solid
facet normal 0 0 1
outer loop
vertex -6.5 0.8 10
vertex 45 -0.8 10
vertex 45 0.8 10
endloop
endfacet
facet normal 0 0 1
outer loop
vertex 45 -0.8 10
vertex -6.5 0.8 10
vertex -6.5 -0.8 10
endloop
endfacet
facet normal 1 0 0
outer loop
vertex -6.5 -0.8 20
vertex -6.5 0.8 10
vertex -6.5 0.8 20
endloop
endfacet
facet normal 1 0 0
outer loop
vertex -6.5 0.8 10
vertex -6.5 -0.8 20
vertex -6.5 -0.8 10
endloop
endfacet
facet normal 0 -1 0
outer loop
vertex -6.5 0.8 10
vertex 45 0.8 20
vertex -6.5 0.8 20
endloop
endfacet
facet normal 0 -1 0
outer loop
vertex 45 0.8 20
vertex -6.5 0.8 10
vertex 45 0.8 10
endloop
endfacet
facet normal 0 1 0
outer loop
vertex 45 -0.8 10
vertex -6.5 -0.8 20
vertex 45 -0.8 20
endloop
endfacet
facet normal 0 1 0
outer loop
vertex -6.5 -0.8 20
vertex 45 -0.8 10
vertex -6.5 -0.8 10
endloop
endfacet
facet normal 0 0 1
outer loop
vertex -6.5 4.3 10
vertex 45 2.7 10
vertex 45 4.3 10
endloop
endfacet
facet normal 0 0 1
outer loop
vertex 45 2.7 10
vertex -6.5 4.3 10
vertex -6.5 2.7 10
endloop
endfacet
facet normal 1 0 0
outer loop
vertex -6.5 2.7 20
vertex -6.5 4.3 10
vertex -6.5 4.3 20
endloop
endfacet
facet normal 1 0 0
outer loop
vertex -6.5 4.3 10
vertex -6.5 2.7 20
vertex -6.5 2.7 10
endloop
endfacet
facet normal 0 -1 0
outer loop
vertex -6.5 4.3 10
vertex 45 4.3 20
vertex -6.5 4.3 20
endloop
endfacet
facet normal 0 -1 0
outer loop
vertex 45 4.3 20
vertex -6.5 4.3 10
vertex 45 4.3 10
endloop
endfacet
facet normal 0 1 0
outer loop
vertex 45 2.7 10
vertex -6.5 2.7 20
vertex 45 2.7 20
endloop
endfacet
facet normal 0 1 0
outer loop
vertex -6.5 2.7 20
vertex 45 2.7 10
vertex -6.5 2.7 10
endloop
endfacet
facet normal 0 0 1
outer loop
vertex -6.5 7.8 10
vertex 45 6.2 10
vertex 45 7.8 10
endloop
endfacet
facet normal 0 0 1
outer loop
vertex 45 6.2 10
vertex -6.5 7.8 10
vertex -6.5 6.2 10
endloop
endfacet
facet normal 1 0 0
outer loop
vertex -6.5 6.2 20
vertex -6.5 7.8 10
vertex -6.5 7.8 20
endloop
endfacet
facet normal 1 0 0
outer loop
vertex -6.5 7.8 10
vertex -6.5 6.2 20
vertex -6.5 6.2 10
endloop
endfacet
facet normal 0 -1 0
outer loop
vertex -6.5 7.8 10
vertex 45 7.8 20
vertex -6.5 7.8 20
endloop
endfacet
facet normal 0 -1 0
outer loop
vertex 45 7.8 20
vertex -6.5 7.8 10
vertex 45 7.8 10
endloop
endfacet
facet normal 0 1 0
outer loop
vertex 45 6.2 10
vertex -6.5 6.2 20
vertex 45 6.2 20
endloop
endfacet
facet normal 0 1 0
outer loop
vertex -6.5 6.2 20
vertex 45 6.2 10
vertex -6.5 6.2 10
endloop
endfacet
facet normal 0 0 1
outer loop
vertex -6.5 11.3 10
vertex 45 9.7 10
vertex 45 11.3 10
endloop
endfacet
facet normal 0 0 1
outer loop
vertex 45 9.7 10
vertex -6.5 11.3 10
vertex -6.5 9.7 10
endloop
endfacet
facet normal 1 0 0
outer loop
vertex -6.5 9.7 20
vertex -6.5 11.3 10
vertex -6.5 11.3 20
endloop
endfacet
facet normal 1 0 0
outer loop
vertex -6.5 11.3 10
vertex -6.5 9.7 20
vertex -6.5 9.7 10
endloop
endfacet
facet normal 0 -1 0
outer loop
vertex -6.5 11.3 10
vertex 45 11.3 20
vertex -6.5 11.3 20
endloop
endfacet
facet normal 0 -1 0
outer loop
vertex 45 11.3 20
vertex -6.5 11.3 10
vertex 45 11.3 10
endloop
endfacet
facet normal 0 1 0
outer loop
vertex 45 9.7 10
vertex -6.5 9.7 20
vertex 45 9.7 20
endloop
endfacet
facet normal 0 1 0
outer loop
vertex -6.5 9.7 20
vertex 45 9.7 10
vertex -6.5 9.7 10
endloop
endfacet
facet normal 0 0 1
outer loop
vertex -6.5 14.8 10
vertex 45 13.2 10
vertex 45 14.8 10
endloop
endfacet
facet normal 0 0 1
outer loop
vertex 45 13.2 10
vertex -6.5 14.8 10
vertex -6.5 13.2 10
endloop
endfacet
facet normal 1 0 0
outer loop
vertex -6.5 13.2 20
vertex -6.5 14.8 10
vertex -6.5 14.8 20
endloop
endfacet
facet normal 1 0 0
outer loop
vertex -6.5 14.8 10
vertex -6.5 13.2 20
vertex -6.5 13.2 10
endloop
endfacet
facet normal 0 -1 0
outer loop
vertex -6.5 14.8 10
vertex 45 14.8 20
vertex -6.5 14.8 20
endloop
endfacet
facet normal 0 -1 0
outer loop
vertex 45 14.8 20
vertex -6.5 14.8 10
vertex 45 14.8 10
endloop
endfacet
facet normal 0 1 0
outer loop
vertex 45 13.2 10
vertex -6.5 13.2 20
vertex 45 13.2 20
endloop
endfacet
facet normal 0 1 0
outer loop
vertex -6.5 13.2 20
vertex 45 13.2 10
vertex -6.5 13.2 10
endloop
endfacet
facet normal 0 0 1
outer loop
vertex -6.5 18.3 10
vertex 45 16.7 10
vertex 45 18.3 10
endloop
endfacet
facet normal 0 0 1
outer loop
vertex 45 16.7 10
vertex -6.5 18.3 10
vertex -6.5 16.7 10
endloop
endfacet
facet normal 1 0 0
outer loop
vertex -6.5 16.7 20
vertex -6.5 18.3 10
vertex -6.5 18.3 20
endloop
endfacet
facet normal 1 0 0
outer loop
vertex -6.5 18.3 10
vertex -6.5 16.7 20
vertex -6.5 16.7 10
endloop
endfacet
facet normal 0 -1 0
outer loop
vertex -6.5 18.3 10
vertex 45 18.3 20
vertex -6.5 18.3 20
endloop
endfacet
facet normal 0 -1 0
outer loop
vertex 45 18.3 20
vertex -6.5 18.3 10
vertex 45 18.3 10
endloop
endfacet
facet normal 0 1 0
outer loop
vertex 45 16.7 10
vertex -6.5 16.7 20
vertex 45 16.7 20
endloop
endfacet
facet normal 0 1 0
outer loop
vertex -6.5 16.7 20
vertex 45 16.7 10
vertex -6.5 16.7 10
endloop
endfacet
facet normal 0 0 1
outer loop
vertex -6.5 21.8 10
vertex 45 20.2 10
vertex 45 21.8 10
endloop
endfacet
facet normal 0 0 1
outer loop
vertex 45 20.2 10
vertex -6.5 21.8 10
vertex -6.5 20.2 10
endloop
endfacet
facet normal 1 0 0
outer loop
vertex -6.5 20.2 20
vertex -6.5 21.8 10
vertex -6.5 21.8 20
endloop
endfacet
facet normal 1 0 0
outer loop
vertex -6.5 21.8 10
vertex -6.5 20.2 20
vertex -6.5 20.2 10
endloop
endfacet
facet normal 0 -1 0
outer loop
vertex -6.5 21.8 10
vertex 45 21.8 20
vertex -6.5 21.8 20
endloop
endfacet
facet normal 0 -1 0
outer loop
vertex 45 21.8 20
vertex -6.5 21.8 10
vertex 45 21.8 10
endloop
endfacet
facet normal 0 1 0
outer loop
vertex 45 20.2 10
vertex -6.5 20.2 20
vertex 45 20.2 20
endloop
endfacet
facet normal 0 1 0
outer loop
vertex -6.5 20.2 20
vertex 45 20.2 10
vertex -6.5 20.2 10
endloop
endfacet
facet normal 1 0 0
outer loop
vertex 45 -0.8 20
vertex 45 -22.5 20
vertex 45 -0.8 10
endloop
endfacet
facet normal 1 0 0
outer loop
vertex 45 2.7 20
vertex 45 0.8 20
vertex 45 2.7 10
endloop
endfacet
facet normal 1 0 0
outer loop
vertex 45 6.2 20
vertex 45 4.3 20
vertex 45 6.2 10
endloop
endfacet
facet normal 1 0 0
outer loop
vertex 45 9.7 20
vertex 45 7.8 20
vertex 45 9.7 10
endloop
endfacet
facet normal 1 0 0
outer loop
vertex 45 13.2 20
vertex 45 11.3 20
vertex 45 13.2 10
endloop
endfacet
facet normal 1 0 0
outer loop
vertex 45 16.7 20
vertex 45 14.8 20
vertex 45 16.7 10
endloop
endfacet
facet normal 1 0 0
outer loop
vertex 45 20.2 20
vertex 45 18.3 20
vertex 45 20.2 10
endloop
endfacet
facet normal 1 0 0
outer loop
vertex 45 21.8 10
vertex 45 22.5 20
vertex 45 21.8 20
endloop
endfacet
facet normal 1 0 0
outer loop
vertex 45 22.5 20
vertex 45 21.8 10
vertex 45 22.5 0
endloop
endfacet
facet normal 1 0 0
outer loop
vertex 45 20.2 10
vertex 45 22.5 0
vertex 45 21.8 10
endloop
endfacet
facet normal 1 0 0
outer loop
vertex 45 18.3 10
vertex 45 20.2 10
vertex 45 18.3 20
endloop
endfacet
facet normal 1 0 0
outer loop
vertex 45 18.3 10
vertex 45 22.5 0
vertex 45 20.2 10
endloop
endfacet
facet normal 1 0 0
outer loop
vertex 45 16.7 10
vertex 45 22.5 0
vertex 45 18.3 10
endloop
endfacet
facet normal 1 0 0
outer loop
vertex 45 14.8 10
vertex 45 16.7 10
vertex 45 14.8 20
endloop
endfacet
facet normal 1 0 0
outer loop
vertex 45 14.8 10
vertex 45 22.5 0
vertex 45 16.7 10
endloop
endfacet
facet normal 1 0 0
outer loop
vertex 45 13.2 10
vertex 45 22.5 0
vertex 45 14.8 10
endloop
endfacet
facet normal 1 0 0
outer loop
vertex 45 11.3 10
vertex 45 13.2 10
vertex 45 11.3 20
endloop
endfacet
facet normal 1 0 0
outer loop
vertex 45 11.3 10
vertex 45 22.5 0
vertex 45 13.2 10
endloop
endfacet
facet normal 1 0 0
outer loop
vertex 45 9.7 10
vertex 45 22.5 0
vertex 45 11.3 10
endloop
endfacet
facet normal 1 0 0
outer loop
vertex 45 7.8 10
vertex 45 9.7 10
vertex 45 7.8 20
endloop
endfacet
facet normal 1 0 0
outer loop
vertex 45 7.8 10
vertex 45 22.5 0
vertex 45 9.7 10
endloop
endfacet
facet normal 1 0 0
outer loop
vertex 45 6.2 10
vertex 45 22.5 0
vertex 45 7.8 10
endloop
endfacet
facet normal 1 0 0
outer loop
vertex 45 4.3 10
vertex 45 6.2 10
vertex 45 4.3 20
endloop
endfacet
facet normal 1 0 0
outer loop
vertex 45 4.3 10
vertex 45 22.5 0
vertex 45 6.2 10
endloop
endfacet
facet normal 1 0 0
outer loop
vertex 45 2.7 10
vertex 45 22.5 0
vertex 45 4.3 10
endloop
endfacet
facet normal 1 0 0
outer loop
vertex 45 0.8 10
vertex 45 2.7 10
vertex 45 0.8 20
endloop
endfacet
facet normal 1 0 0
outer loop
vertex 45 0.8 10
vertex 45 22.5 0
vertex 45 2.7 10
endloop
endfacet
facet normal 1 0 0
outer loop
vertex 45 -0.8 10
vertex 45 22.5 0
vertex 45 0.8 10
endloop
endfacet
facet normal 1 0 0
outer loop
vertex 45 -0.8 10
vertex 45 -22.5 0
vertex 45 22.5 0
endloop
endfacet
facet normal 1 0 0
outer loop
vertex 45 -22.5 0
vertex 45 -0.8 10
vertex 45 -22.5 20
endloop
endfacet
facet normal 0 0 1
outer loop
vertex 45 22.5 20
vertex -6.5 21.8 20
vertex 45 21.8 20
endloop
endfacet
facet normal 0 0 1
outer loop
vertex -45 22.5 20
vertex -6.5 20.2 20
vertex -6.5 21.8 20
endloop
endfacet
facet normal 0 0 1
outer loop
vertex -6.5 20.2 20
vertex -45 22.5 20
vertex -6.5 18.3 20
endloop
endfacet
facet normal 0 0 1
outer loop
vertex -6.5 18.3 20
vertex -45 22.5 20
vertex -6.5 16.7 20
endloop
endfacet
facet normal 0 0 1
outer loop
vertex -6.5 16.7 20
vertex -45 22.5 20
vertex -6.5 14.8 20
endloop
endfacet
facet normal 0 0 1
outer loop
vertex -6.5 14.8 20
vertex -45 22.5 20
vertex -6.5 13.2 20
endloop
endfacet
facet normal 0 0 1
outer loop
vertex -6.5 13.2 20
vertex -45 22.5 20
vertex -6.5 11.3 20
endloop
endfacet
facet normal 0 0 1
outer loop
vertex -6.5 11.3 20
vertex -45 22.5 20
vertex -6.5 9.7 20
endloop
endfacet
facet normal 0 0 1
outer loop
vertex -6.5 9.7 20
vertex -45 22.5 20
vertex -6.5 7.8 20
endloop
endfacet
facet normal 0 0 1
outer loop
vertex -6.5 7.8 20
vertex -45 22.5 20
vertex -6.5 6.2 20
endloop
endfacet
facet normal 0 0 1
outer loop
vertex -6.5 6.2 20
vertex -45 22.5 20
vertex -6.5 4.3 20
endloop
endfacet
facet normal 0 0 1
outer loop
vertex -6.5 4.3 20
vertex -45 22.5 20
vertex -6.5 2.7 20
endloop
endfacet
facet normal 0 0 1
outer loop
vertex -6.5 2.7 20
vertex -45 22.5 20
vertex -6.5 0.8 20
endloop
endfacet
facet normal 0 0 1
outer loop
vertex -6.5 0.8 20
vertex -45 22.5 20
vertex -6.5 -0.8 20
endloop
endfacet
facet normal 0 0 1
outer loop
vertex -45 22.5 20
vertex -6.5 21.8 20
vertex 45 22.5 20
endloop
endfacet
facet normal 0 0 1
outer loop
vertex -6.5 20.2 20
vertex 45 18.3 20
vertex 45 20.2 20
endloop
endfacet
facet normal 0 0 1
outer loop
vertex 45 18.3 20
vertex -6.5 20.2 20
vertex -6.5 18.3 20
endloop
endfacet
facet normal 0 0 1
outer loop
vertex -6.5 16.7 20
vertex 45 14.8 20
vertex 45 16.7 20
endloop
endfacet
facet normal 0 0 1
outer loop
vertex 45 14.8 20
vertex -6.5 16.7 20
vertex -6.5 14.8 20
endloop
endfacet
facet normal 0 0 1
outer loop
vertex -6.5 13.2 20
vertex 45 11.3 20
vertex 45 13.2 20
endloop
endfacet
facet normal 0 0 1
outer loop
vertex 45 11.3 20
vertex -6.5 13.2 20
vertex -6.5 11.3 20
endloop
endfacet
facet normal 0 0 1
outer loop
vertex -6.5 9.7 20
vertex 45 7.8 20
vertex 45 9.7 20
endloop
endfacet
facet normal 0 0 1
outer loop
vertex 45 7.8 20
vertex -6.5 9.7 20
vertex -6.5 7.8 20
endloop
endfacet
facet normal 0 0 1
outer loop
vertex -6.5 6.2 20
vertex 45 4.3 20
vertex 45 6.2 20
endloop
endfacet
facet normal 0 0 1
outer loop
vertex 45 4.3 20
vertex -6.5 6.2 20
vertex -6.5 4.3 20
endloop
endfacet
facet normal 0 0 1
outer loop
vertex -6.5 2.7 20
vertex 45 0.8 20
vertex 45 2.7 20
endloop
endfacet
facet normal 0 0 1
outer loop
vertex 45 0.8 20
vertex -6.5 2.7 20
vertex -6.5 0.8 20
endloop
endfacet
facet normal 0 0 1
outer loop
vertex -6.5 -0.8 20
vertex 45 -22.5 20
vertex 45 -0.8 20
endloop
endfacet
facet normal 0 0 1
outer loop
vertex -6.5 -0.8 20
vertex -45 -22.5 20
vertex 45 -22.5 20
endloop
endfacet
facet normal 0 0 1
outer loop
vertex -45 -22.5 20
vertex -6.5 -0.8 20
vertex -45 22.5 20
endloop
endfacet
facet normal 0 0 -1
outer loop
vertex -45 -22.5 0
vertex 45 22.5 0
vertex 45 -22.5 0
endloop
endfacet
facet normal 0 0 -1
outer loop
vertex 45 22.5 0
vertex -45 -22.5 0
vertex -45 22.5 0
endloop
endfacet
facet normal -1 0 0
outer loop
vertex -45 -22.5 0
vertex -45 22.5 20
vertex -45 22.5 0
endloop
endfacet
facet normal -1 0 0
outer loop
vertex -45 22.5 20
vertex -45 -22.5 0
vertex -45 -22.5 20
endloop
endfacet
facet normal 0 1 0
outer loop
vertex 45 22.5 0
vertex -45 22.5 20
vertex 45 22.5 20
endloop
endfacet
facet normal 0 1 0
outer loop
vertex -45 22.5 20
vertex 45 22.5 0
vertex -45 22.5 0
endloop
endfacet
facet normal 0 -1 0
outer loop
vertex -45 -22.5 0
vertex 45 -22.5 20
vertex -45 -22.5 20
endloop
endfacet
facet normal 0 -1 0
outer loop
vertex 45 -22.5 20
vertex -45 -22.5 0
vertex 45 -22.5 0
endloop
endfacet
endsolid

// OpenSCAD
// Microscope slide drying rack
// Print orientation: base block on XY plane, slots open upward (+Z)

// ---------- Block ----------
block_len   = 90;    // block length along X (mm)
block_wid   = 45;    // block width along Y (mm)
block_ht    = 20;    // block height along Z (mm)

// ---------- Slots ----------
slot_count  = 10;    // number of slide slots
slot_len    = 77;    // slot length along X (mm)
slot_wid    = 1.6;   // slot width along Y (mm)
slot_depth  = 10;    // slot depth into block from top face (mm)
slot_pitch  = 3.5;   // centre-to-centre spacing along Y (mm)

// ---------- Misc ----------
eps         = 0.5;   // cutter overshoot past top face (mm)
$fn         = 64;

// X position of first slot so the slot group is centred on the block
slot_x0     = -(block_len - slot_len) / 2;

difference() {
    // Base block
    translate([-block_len / 2, -block_wid / 2, 0])
        cube([block_len, block_wid, block_ht]);

    // Parallel slots running along X
    for (i = [0 : slot_count - 1]) {
        translate([slot_x0, -slot_wid / 2 + i * slot_pitch, block_ht - slot_depth])
            cube([slot_len, slot_wid, slot_depth + eps]);
    }
}
